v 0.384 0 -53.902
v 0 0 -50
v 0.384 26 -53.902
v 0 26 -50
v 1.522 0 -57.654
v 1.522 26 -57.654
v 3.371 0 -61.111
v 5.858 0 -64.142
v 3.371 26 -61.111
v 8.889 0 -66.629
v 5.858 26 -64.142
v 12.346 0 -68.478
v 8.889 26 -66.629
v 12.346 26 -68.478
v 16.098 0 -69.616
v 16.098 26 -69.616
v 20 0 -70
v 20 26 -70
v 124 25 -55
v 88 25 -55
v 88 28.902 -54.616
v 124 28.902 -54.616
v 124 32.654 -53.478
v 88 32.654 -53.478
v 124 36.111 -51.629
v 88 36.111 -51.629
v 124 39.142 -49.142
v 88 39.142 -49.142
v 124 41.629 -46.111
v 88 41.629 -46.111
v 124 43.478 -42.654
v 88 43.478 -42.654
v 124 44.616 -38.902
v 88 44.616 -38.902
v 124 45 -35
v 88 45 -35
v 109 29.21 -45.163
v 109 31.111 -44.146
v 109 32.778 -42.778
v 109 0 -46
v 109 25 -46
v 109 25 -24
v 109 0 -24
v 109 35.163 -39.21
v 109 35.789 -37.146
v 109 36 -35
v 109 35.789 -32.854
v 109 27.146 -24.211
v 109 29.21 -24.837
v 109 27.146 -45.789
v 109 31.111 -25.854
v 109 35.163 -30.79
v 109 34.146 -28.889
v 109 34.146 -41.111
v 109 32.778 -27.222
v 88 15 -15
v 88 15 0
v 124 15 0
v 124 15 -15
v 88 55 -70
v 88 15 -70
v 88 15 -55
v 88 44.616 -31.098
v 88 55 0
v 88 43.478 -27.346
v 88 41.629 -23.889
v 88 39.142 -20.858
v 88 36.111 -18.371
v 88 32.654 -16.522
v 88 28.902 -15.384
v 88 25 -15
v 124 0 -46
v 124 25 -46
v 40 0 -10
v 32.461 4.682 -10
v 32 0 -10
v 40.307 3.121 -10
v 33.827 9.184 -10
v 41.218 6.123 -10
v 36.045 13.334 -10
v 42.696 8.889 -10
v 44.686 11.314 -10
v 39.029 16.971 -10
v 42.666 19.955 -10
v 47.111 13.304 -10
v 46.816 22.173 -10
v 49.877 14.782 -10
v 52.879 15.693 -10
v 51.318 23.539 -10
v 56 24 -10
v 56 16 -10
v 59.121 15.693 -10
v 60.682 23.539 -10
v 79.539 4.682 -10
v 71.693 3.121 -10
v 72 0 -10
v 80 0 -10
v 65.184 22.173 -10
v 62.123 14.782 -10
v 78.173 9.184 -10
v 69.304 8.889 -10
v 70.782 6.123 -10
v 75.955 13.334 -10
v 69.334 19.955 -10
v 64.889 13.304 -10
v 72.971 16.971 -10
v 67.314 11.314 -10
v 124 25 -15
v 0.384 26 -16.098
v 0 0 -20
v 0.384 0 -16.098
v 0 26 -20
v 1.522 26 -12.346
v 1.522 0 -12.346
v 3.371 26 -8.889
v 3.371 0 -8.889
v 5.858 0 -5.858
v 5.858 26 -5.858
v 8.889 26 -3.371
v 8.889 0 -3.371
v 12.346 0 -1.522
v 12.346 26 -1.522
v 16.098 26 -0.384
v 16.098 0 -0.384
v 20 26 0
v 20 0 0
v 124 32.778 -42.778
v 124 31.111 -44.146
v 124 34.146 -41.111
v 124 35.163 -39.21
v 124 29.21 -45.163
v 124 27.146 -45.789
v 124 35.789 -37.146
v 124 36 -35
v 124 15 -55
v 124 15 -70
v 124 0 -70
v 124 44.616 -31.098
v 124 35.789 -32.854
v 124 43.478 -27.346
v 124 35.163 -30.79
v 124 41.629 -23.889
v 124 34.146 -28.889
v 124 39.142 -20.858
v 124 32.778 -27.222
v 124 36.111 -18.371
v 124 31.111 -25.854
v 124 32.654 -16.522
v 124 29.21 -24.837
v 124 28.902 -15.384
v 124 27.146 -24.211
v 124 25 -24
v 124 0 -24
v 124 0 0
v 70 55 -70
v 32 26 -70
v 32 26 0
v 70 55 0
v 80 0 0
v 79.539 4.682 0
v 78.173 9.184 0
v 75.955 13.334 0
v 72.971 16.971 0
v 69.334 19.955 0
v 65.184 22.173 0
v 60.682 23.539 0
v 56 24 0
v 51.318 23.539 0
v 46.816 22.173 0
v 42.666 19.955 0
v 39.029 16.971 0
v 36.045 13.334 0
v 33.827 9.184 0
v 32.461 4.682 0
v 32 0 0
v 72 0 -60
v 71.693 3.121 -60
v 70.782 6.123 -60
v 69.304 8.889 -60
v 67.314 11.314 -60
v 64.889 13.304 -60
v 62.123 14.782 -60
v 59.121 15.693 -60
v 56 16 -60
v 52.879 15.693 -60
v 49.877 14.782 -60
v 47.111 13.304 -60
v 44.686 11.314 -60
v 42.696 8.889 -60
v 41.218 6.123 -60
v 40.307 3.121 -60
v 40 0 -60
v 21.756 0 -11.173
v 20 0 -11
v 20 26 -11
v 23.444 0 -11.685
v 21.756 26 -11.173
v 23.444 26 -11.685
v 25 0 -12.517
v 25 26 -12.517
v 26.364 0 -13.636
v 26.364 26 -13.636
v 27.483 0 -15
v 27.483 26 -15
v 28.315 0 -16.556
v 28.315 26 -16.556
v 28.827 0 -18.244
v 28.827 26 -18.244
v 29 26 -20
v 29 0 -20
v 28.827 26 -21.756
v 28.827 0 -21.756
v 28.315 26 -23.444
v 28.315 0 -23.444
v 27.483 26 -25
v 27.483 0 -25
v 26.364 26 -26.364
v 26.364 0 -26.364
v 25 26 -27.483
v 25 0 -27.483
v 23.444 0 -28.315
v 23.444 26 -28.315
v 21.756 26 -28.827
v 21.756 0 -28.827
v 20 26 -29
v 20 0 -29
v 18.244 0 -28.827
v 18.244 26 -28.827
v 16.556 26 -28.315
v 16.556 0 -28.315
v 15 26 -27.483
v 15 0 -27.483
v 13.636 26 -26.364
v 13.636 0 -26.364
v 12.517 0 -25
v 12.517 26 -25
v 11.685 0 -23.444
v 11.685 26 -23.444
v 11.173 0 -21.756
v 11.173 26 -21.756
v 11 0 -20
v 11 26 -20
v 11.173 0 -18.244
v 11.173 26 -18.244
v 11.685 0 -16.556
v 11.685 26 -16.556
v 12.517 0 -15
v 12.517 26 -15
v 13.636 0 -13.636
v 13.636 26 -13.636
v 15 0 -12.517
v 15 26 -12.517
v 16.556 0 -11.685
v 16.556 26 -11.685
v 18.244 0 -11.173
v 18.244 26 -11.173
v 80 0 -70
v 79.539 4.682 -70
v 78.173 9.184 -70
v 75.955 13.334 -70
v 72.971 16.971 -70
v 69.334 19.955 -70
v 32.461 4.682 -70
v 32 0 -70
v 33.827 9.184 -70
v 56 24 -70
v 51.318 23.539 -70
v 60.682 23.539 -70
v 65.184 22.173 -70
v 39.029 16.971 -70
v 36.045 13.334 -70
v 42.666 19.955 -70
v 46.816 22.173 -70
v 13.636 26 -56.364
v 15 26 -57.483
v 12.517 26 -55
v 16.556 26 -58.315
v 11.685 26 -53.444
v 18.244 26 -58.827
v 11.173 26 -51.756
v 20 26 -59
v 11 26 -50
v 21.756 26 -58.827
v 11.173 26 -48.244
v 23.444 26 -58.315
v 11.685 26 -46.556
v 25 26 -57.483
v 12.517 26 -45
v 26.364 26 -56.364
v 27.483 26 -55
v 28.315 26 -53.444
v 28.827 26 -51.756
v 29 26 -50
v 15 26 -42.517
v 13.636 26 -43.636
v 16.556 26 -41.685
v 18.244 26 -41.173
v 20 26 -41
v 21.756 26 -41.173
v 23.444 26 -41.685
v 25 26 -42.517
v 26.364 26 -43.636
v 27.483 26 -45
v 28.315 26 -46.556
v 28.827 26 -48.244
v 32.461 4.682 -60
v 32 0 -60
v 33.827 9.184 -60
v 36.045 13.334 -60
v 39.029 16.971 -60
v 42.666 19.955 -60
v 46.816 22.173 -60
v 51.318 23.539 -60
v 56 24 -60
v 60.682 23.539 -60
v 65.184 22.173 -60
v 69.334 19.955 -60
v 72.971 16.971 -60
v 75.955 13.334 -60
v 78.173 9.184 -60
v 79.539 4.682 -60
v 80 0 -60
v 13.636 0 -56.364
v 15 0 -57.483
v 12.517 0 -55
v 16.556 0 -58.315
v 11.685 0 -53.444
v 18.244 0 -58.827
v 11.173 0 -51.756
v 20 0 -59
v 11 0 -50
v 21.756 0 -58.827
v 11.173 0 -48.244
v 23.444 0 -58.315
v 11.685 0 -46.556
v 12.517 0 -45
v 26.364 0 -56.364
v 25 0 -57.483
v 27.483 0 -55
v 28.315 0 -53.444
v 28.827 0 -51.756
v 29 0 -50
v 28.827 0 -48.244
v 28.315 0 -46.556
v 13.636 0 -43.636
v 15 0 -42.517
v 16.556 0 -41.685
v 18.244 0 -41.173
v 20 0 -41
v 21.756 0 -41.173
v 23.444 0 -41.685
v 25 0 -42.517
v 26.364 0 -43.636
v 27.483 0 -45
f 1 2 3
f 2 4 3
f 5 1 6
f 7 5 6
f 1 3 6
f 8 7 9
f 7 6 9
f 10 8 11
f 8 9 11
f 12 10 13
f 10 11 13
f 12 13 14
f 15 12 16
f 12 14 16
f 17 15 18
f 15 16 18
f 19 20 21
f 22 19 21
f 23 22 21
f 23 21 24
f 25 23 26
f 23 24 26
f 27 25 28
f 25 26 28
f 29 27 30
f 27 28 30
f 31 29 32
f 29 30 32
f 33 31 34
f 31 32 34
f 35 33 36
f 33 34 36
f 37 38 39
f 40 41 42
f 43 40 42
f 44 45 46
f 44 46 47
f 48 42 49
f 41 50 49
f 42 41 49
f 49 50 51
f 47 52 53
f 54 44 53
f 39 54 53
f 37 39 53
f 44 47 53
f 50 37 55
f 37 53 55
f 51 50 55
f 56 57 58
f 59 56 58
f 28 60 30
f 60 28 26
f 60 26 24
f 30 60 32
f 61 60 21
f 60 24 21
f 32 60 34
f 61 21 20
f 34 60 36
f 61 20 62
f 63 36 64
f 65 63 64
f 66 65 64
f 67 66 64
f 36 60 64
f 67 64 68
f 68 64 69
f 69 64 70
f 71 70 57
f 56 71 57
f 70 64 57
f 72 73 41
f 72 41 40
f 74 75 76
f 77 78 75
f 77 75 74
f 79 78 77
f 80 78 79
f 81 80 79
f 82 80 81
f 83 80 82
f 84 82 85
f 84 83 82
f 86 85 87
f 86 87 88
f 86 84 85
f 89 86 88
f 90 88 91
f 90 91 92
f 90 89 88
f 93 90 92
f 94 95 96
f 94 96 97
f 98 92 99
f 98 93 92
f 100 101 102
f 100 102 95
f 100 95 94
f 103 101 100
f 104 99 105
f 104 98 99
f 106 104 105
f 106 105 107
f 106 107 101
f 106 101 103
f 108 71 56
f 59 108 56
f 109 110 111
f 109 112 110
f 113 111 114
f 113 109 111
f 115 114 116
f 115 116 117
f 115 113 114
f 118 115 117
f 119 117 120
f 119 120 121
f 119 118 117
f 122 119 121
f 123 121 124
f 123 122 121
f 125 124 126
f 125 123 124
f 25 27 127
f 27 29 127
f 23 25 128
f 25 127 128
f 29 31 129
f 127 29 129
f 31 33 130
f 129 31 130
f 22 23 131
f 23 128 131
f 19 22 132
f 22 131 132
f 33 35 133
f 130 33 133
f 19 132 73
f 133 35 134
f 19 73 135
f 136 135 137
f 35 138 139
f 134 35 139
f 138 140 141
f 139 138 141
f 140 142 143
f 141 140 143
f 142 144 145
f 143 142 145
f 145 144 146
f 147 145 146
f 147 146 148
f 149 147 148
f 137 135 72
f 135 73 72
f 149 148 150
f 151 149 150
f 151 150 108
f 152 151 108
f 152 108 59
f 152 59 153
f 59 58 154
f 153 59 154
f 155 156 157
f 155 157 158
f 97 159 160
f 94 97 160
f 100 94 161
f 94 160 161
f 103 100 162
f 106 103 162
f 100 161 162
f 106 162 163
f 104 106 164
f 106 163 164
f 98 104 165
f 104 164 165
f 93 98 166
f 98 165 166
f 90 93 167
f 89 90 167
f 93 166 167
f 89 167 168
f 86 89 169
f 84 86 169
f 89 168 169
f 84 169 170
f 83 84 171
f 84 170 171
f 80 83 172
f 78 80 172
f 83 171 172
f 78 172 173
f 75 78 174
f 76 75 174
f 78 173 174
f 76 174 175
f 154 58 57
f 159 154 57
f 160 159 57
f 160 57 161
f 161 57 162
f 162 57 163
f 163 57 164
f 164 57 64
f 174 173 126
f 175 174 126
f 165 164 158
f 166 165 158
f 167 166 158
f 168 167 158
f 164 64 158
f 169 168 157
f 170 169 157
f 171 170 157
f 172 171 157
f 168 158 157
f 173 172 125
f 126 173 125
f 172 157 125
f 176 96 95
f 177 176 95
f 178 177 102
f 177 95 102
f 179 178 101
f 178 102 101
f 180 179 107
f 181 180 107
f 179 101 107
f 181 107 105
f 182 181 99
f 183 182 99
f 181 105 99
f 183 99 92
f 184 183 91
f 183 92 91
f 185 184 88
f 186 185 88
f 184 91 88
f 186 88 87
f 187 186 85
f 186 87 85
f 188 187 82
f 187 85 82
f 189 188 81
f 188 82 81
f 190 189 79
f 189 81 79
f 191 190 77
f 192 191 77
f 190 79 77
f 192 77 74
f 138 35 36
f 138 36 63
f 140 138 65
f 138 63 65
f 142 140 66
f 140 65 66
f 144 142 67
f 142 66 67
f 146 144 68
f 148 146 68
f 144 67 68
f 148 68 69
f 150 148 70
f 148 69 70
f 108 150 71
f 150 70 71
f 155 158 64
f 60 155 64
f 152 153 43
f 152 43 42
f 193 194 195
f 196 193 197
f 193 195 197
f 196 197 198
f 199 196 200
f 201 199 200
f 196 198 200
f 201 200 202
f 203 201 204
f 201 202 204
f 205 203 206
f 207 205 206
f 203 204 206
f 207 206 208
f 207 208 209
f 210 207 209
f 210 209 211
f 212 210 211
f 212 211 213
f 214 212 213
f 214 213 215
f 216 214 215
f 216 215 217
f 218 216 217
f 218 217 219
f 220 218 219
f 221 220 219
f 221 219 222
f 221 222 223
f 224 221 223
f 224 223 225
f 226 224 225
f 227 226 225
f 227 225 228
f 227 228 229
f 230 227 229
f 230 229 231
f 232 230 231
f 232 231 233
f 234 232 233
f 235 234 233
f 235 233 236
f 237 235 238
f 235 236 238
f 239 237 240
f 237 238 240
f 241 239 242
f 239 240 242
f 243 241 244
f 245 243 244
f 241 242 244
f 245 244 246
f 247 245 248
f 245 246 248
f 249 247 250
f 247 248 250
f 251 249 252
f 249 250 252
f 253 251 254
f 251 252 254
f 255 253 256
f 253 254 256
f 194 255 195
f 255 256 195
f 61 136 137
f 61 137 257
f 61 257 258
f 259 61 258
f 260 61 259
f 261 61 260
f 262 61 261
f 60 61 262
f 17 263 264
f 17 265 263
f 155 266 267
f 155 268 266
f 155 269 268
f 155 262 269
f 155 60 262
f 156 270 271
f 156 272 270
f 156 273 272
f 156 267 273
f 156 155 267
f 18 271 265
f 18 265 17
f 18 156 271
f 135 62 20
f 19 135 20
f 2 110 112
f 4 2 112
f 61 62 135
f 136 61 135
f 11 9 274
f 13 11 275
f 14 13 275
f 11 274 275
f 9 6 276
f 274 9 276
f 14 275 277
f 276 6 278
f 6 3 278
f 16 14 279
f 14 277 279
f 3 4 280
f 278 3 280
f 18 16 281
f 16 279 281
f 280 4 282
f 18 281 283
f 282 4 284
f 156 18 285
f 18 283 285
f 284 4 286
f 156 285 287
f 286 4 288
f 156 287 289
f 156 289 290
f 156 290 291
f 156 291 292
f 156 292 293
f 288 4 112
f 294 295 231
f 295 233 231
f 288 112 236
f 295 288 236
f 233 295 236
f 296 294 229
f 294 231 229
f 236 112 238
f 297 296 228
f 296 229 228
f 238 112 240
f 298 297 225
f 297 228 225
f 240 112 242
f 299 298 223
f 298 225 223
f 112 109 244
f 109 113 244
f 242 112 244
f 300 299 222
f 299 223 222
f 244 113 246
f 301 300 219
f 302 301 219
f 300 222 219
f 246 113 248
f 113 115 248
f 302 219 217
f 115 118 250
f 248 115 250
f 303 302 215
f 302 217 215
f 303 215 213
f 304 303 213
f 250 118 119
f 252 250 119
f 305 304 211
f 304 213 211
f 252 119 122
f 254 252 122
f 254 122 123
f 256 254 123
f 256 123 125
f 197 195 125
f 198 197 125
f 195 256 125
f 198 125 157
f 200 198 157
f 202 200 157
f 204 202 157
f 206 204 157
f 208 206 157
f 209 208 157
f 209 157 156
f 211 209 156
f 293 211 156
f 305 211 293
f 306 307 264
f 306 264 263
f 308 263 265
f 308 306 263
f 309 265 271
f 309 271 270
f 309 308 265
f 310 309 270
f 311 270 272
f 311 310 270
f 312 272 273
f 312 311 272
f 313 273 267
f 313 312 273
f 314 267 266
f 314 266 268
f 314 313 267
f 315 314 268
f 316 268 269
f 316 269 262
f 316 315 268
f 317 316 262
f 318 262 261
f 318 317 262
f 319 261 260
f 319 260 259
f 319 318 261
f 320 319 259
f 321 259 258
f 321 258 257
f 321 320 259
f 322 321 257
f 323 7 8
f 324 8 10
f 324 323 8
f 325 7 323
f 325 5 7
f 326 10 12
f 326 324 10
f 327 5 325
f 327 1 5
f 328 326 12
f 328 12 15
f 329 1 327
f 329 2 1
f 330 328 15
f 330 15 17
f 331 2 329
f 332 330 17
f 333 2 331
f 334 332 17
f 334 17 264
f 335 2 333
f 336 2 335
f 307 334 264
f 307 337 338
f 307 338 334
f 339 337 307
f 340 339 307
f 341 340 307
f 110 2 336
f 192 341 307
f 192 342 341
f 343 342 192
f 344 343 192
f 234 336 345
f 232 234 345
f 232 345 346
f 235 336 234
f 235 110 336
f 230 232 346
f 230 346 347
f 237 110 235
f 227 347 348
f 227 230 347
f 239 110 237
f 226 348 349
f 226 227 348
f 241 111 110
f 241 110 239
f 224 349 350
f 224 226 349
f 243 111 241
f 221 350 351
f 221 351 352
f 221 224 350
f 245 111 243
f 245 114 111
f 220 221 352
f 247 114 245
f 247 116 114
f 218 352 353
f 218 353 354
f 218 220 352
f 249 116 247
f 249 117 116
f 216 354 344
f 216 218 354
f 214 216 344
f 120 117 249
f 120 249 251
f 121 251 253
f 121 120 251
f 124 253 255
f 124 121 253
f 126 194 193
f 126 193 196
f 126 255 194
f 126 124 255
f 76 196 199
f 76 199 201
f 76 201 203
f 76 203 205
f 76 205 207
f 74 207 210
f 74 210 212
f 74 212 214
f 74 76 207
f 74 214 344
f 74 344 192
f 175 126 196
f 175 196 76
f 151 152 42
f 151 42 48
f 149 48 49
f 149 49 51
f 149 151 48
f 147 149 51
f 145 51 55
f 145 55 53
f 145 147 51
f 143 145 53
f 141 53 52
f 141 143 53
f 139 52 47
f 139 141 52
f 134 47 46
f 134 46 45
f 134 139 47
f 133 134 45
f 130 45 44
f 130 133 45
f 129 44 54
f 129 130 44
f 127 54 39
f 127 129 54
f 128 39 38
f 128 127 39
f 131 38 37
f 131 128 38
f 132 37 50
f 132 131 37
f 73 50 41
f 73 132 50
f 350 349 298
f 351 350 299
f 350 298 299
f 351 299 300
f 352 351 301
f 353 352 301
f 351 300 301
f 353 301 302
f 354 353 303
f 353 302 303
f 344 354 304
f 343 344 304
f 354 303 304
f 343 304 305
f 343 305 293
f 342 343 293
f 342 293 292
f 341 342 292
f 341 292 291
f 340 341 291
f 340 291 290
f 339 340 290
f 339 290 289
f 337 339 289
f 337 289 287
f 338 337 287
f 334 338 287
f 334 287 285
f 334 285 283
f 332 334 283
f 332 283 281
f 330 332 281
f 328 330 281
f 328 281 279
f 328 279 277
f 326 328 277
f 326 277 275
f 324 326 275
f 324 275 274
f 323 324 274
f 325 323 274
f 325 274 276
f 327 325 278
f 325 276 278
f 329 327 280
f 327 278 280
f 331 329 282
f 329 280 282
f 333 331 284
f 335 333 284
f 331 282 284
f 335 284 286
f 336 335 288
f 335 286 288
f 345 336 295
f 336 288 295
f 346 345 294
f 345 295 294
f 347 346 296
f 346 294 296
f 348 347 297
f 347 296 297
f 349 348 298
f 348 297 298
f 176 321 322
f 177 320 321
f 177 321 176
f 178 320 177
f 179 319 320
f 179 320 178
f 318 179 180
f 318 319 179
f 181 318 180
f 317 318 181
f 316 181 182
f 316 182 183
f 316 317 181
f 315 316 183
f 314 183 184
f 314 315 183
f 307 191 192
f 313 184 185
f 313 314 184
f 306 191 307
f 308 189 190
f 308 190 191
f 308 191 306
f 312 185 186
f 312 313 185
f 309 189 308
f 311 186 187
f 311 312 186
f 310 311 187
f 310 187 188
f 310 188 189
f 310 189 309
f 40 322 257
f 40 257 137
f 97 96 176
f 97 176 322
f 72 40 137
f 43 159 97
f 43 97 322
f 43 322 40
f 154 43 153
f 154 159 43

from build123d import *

# Parameters (mm, degrees)
EXTRUDE_1_DEPTH     = 70
FILLET_1_R          = 20
SKETCH_4_R          = 9
CUT_EXTRUDE_1_DEPTH = 146.316895095
CUT_EXTRUDE_2_DEPTH = 10
CUT_EXTRUDE_3_DEPTH = 153.646650799
CUT_EXTRUDE_START   = -10
SKETCH_6_R          = 24
CUT_EXTRUDE_4_DEPTH = 10
EXTRUDE_2_DEPTH     = 36
CUT_EXTRUDE_5_DEPTH = 15


with BuildPart() as part:
    # 草圖3 → 填料-伸長1 (new body)
    with BuildSketch(Plane.XY):
        Polygon((0, 0), (0, 26), (32, 26), (70, 55), (88, 55), (88, 15), (124, 15), (124, 0), (30.697426797, 0), align=None)
    extrude(amount=-EXTRUDE_1_DEPTH)

    # 圓角1
    fillet_1_edges = [part.edges().sort_by_distance(p)[0] for p in [
        (0, 13, -70),
        (0, 13, 0),
    ]]
    fillet(fillet_1_edges, radius=FILLET_1_R)

    # 草圖4 → 除料-伸長1 (cut, through all)
    with BuildSketch(Plane(origin=(0, 26, 0), x_dir=(1, 0, 0), z_dir=(0, 1, 0))):
        with Locations((20, 20)):
            Circle(SKETCH_4_R)
        with Locations((20, 50)):
            Circle(SKETCH_4_R)
    extrude(amount=-CUT_EXTRUDE_1_DEPTH, mode=Mode.SUBTRACT)

    # 草圖5 → 除料-伸長2 (cut)
    with BuildSketch(Plane.XY):
        with BuildLine():
            ThreePointArc((80, 0), (56, 24), (32, 0))
            Line((32, 0), (40, 0))
            ThreePointArc((40, 0), (56, 16), (72, 0))
            Line((72, 0), (80, 0))
        make_face()
    extrude(amount=-CUT_EXTRUDE_2_DEPTH, mode=Mode.SUBTRACT)

    # 草圖5<3> → 除料-伸長3 (cut, through all)
    with BuildSketch(Plane.XY):
        with BuildLine():
            ThreePointArc((72, 0), (56, 16), (40, 0))
            Line((40, 0), (72, 0))
        make_face()
    extrude(amount=-CUT_EXTRUDE_3_DEPTH, mode=Mode.SUBTRACT)

    # 草圖6 → 除料-伸長4 (cut)
    with BuildSketch(Plane(origin=(0, 0, -70), x_dir=(-1, 0, 0), z_dir=(0, 0, -1)).offset(CUT_EXTRUDE_START)):
        with Locations((-56, 0)):
            Circle(SKETCH_6_R)
    extrude(amount=CUT_EXTRUDE_4_DEPTH, mode=Mode.SUBTRACT)

    # 草圖7 → 填料-伸長2 (add)
    with BuildSketch(Plane(origin=(88, 0, 0), x_dir=(0, 0, -1), z_dir=(1, 0, 0))):
        with BuildLine():
            Line((15, 15), (55, 15))
            Line((55, 15), (55, 25))
            ThreePointArc((55, 25), (35, 45), (15, 25))
            Line((15, 25), (15, 15))
        make_face()
    extrude(amount=EXTRUDE_2_DEPTH)

    # 草圖8 → 除料-伸長5 (cut)
    with BuildSketch(Plane(origin=(124, 0, 0), x_dir=(0, 0, -1), z_dir=(1, 0, 0))):
        with BuildLine():
            Line((24, 0), (24, 25))
            ThreePointArc((24, 25), (35, 36), (46, 25))
            Line((46, 25), (46, 0))
            Line((46, 0), (24, 0))
        make_face()
    extrude(amount=-CUT_EXTRUDE_5_DEPTH, mode=Mode.SUBTRACT)


solid = part.part
